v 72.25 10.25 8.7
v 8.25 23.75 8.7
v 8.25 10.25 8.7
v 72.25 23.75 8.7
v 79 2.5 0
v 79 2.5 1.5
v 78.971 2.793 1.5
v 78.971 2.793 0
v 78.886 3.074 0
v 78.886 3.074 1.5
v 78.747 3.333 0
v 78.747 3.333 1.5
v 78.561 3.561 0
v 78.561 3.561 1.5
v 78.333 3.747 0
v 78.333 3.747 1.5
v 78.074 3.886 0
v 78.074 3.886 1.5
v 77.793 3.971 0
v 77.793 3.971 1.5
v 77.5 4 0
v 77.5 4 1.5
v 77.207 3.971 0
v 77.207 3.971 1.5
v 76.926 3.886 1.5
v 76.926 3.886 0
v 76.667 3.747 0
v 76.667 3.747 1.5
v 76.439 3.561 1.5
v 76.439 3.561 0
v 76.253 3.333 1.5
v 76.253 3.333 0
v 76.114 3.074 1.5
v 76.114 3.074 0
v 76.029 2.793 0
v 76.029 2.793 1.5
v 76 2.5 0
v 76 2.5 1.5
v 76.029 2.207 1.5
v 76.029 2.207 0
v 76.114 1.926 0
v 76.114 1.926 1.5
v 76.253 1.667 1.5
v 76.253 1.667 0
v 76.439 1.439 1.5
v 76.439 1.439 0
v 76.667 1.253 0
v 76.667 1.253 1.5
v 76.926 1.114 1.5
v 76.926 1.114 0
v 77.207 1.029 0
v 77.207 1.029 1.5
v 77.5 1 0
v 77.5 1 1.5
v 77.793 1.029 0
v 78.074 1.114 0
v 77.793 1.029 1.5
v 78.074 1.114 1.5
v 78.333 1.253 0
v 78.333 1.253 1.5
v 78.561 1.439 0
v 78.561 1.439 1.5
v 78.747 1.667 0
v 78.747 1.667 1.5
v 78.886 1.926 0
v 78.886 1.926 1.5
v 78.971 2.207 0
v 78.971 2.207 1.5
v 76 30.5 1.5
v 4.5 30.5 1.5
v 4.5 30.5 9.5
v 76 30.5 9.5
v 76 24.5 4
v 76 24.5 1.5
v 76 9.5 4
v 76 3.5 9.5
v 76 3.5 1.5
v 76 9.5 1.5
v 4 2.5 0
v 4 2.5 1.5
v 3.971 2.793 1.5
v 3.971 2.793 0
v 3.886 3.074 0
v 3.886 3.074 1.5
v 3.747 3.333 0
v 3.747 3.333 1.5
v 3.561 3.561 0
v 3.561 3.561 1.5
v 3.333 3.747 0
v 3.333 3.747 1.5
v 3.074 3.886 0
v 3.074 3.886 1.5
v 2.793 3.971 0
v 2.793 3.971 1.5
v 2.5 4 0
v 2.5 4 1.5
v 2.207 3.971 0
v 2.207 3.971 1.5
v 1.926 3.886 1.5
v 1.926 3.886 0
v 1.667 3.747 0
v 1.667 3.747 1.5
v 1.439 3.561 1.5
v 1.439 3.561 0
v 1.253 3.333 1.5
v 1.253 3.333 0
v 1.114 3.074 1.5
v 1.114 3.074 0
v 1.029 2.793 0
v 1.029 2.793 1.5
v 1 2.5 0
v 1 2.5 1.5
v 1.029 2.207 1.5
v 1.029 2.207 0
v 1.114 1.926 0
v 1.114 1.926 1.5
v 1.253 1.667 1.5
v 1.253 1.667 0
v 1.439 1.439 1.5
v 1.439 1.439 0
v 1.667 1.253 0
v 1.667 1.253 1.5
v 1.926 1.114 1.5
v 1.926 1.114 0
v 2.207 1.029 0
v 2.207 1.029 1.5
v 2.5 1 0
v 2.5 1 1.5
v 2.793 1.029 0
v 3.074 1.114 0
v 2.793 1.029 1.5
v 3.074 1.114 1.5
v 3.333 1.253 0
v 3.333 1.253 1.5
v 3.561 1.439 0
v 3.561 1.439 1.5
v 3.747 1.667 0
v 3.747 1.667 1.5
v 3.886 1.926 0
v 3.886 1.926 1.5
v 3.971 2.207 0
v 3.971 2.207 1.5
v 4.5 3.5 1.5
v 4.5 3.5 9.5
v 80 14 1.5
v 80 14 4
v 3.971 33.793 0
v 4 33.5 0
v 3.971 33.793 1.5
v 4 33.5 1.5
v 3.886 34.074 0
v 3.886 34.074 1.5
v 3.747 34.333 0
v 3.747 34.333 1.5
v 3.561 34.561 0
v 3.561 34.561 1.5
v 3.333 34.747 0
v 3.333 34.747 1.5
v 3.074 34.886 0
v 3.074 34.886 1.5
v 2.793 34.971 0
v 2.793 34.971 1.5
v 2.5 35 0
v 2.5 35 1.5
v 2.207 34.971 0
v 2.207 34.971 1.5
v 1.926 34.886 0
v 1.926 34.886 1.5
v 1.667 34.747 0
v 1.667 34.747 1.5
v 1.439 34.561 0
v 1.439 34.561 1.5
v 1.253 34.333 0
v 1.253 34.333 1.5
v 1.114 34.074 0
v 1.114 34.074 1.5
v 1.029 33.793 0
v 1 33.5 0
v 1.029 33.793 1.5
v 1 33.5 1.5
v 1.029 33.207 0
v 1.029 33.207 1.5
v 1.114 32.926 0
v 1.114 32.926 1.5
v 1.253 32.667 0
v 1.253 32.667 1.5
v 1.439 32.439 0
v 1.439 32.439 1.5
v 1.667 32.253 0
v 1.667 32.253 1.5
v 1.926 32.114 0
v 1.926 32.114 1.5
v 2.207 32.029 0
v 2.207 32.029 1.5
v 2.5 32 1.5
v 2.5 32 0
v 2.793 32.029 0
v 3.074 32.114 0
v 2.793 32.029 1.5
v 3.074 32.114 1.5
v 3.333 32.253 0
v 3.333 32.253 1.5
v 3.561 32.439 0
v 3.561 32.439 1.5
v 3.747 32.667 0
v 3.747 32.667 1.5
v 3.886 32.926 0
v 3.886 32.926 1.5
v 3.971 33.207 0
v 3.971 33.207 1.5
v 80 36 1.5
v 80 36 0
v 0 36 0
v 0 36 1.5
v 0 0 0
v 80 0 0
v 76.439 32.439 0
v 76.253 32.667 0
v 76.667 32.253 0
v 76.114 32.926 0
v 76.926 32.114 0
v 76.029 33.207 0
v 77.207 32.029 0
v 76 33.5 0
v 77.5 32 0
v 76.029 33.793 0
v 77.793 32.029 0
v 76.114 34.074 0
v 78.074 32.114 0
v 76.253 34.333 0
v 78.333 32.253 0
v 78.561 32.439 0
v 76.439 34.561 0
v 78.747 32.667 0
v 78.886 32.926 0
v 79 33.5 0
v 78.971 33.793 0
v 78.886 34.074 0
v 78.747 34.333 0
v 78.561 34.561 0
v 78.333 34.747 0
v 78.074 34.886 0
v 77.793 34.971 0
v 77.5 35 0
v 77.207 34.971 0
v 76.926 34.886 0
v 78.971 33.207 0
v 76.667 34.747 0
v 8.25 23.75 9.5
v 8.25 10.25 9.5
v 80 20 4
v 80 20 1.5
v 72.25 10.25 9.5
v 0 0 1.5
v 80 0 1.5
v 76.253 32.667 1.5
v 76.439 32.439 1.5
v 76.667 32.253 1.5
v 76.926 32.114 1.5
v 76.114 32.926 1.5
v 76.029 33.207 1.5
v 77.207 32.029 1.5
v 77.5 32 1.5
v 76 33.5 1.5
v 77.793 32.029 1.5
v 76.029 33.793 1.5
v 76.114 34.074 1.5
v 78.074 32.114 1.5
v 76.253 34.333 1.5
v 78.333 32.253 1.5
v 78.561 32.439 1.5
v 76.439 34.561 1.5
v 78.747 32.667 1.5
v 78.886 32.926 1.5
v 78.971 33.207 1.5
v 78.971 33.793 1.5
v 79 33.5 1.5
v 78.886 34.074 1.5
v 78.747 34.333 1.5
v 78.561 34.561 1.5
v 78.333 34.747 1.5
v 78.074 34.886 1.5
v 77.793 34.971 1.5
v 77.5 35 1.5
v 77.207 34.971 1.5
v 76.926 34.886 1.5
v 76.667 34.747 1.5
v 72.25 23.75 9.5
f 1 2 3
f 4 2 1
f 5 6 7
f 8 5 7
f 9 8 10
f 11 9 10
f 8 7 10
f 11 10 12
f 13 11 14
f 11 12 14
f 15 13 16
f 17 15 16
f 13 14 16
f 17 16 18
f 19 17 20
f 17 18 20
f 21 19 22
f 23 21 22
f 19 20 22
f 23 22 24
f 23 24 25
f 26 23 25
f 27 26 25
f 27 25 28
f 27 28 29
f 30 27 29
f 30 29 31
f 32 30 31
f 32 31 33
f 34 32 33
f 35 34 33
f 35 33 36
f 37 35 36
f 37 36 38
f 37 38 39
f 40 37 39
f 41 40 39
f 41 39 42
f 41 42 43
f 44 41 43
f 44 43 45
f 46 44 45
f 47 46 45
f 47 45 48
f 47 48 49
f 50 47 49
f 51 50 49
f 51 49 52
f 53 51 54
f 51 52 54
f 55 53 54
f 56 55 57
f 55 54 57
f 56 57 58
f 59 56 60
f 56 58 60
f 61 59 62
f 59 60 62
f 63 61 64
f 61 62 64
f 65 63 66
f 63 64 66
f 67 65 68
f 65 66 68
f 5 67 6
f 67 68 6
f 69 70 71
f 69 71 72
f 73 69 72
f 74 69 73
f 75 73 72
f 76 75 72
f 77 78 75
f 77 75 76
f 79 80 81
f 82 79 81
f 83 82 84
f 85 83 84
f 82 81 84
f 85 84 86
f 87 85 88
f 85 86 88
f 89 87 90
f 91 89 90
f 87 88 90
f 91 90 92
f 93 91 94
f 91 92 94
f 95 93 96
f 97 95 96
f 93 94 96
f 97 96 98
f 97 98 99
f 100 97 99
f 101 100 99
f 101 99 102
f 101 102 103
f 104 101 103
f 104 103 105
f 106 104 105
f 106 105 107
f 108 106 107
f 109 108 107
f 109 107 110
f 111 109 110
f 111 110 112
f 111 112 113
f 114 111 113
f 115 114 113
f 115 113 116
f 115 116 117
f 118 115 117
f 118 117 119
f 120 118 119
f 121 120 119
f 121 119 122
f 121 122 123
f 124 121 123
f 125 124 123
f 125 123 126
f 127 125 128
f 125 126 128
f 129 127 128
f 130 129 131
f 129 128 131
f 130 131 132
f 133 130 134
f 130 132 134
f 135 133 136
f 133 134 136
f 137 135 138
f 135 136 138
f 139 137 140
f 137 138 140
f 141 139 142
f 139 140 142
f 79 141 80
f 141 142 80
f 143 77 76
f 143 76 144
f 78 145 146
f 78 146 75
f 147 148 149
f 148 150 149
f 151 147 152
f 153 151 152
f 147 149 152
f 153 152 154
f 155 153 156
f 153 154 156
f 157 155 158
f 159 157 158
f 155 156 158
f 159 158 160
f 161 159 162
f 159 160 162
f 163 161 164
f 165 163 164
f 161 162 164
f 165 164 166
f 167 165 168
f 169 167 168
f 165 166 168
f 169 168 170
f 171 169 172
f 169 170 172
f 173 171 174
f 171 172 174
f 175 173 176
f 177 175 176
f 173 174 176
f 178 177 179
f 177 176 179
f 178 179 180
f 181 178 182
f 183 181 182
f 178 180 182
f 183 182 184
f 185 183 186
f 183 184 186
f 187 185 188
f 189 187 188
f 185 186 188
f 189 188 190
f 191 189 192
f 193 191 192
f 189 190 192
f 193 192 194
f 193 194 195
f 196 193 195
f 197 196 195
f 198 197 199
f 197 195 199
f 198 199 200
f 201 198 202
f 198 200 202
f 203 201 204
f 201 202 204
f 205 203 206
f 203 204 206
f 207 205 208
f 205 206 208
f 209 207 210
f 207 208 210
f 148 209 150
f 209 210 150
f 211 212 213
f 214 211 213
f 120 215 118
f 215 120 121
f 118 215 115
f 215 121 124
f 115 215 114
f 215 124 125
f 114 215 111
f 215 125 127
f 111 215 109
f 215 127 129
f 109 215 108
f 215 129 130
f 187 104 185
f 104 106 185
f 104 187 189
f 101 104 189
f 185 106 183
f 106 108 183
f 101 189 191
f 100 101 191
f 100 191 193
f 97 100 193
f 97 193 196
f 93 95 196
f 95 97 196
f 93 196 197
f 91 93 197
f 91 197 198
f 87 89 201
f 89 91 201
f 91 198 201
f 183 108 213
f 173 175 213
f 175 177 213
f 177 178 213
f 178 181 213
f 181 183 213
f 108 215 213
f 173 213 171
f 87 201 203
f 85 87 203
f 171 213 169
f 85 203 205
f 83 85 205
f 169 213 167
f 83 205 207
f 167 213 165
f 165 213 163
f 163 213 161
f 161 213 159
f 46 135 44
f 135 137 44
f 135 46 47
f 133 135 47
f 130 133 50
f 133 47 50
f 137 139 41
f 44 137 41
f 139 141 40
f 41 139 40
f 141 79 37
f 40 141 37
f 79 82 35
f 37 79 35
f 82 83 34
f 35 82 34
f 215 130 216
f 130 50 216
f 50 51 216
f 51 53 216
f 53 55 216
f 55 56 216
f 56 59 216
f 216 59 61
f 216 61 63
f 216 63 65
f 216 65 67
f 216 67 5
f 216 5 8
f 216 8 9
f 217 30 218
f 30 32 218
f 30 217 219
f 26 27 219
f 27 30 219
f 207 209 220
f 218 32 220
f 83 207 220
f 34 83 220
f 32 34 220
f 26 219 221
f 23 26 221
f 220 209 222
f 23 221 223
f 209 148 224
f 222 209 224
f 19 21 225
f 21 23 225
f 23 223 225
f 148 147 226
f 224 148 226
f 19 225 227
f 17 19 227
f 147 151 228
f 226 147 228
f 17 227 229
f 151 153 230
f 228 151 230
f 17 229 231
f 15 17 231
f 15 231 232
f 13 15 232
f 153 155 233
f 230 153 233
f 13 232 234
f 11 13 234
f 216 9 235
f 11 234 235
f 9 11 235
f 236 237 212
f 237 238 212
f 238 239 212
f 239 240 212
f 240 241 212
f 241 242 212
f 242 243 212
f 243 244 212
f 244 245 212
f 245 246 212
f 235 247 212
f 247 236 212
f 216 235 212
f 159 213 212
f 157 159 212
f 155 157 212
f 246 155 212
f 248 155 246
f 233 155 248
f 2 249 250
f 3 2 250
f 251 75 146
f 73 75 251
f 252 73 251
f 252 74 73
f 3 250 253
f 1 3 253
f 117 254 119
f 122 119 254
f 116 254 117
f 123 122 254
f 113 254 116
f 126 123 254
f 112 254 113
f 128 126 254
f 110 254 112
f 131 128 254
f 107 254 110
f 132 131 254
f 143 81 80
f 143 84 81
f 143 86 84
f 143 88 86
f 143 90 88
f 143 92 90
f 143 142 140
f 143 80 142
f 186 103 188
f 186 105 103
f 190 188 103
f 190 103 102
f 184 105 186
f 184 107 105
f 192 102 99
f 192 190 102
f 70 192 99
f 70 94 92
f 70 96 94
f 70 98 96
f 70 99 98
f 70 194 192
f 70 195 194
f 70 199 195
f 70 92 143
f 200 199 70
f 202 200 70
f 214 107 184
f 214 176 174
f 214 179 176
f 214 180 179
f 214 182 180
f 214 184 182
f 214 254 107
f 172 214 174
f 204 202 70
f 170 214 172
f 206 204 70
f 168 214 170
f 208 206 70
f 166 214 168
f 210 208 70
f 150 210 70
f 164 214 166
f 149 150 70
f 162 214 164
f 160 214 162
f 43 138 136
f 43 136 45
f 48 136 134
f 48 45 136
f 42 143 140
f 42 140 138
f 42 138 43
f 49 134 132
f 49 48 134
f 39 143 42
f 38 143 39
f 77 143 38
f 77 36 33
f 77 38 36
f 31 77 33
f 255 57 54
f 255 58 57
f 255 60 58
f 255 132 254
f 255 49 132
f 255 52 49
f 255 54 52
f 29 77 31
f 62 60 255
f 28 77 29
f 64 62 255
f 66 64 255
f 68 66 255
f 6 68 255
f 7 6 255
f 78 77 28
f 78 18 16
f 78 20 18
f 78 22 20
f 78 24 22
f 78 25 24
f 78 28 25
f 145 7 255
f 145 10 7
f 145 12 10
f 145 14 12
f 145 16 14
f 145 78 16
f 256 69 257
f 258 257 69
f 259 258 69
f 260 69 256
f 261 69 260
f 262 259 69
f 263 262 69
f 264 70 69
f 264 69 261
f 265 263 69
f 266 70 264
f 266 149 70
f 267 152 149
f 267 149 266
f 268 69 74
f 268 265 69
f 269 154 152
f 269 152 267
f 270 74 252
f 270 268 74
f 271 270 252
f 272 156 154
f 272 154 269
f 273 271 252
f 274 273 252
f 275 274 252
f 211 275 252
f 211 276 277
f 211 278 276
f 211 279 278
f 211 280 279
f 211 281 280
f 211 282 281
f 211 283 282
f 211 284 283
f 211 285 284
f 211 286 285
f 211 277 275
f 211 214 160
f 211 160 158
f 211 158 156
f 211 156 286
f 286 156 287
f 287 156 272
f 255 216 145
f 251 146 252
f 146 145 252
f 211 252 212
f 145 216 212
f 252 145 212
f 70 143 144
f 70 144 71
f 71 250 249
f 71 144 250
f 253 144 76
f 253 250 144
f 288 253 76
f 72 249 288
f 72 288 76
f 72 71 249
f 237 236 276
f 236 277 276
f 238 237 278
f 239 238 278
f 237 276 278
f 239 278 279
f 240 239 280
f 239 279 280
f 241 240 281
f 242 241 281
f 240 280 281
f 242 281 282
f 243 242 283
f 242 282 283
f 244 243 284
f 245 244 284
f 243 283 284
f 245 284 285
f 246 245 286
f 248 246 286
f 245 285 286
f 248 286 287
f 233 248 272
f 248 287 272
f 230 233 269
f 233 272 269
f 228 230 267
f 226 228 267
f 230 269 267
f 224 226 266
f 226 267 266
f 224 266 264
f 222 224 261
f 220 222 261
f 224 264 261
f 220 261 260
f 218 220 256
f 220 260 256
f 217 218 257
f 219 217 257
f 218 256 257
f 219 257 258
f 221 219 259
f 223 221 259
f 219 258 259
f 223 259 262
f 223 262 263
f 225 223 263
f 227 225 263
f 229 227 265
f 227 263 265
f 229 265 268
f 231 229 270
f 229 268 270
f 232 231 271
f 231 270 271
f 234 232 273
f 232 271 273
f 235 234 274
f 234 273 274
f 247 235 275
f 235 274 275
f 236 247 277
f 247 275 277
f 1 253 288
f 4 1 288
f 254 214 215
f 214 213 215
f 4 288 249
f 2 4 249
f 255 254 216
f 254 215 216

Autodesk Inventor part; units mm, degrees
ref_plane "YZ Plane" through (0, 0, 0) normal (1, 0, 0) x (0, 1, 0)
ref_plane "XZ Plane" through (0, 0, 0) normal (0, 1, 0) x (-1, 0, 0)
ref_plane "XY Plane" through (0, 0, 0) normal (0, 0, 1) x (1, 0, 0)
sketch "스케치1" plane through (0, 0, 0) normal (0, 0, 1) x (1, 0, 0)
  line L0 (0, 0) -> (80, 0)
  line L1 (80, 0) -> (80, 36)
  line L2 (80, 36) -> (0, 36)
  line L3 (0, 36) -> (0, 0)
  dimension "d0" = 80
  dimension "d1" = 36
extrude "돌출1" add sketch "스케치1" along normal blind 1.5
sketch "스케치2" plane through (0, 0, 1.5) normal (0, 0, 1) x (1, 0, 0)
  line L0 (80, 36) -> (0, 36) projected
  line L1 (0, 36) -> (0, 0) projected
  line L2 (4.5, 30.5) -> (76, 30.5)
  line L3 (76, 30.5) -> (76, 3.5)
  line L4 (76, 3.5) -> (4.5, 3.5)
  line L5 (4.5, 3.5) -> (4.5, 30.5)
  dimension "d4" = 71.5
  dimension "d5" = 27
  dimension "d6" = 5.5
  dimension "d7" = 4.5
extrude "돌출2" add sketch "스케치2" along normal blind 8
sketch "스케치3" plane through (0, 0, 1.5) normal (0, 0, 1) x (1, 0, 0)
  line L0 (76, 30.5) -> (76, 3.5) projected
  line L1 (76, 24.5) -> (76, 9.5)
  line L2 (80, 20) -> (80, 14)
  line L3 (76, 24.5) -> (80, 20)
  line L4 (80, 14) -> (76, 9.5)
  point P0 (80, 36)
  point P1 (76, 17)
  point P2 (80, 17)
  point P3 (76, 17)
  dimension "d10" = 15
  dimension "d11" = 6
extrude "돌출3" add sketch "스케치3" along normal blind 2.5
sketch "스케치5" plane through (0, 0, 9.5) normal (0, 0, 1) x (1, 0, 0)
  line L0 (76, 30.5) -> (4.5, 30.5) projected
  line L1 (4.5, 30.5) -> (4.5, 3.5) projected
  line L2 (72.25, 23.75) -> (8.25, 23.75)
  line L3 (8.25, 23.75) -> (8.25, 10.25)
  line L4 (8.25, 10.25) -> (72.25, 10.25)
  line L5 (72.25, 10.25) -> (72.25, 23.75)
  line L6 (72.25, 23.75) -> (8.25, 10.25) construction
  line L7 (8.25, 23.75) -> (72.25, 10.25) construction
  point P0 (0, 0)
  point P1 (40.25, 17)
  point P2 (40.25, 17)
  point P3 (4.5, 17)
  point P4 (40.25, 17)
  point P5 (40.25, 30.5)
  dimension "d15" = 64
  dimension "d16" = 13.5
extrude "돌출4" cut sketch "스케치5" against normal blind 0.8
sketch "스케치6" plane through (0, 0, 1.5) normal (0, 0, 1) x (1, 0, 0)
  line L0 (80, 20) -> (80, 36) projected
  line L1 (80, 36) -> (0, 36) projected
  line L2 (0, 36) -> (0, 0) projected
  line L3 (0, 0) -> (80, 0) projected
  circle A0 centre (2.5, 33.5) radius 1.5
  circle A1 centre (77.5, 33.5) radius 1.5
  circle A2 centre (77.5, 2.5) radius 1.5
  circle A3 centre (2.5, 2.5) radius 1.5
  dimension "d19" = 80
  dimension "d20" = 3
  dimension "d21" = 3
  dimension "d22" = 3
  dimension "d23" = 3
  dimension "d24" = 1
  dimension "d25" = 1
  dimension "d26" = 1
  dimension "d27" = 1
extrude "돌출5" cut sketch "스케치6" against normal through all
sketch "스케치7" plane through (0, 0, 9.5) normal (0, 0, 1) x (1, 0, 0)
  line L0 (8.25, 10.25) -> (8.25, 23.75) projected
  line L1 (8.25, 23.75) -> (72.25, 23.75) projected
  line L2 (72.25, 23.75) -> (72.25, 10.25) projected
  line L3 (72.25, 10.25) -> (8.25, 10.25) projected
  line L4 (76, 30.5) -> (4.5, 30.5) projected
  line L5 (4.5, 30.5) -> (4.5, 3.5) projected
  line L6 (4.5, 3.5) -> (76, 3.5) projected
  line L7 (76, 3.5) -> (76, 30.5) projected
  circle A0 centre (77.5, 2.5) radius 1.5 projected
  circle A1 centre (2.5, 33.5) radius 1.5 projected
  circle A2 centre (77.5, 33.5) radius 1.5 projected
  circle A3 centre (2.5, 2.5) radius 1.5 projected
  line L8 (76, 24.5) -> (80, 20) projected
  line L9 (80, 20) -> (80, 36) projected
  line L10 (80, 36) -> (0, 36) projected
  line L11 (0, 36) -> (0, 0) projected
  line L12 (0, 0) -> (80, 0) projected
  line L13 (80, 0) -> (80, 14) projected
  line L14 (80, 14) -> (76, 9.5) projected
  line L15 (76, 9.5) -> (76, 3.5) projected
  line L16 (76, 3.5) -> (4.5, 3.5) projected
  line L17 (4.5, 3.5) -> (4.5, 30.5) projected
  line L18 (4.5, 30.5) -> (76, 30.5) projected
  line L19 (76, 30.5) -> (76, 24.5) projected
  line L20 (2.5, 33.5) -> (77.5, 33.5)
  line L21 (77.5, 33.5) -> (77.5, 2.5)
  line L22 (77.5, 2.5) -> (2.5, 2.5)
  line L23 (2.5, 2.5) -> (2.5, 33.5)
  line L24 (40, 33.5) -> (40, -15.5556)
  line L25 (2.5, 18) -> (93.9243, 18)
  line L26 (8.25, 17) -> (83.8017, 17) construction
  line L27 (40.25, 23.75) -> (40.25, -12.7239) construction
  line L28 (40, 18) -> (40.25, 18)
  line L29 (40.25, 18) -> (40.25, 17)
  dimension "d30" = 80
  dimension "d31" = 36
  dimension "d32" = 75
  dimension "d33" = 31
  dimension "d34" = 71.5
  dimension "d35" = 27
  dimension "d36" = 1
  dimension "d37" = 0.25
properties part number "1806LCD"
